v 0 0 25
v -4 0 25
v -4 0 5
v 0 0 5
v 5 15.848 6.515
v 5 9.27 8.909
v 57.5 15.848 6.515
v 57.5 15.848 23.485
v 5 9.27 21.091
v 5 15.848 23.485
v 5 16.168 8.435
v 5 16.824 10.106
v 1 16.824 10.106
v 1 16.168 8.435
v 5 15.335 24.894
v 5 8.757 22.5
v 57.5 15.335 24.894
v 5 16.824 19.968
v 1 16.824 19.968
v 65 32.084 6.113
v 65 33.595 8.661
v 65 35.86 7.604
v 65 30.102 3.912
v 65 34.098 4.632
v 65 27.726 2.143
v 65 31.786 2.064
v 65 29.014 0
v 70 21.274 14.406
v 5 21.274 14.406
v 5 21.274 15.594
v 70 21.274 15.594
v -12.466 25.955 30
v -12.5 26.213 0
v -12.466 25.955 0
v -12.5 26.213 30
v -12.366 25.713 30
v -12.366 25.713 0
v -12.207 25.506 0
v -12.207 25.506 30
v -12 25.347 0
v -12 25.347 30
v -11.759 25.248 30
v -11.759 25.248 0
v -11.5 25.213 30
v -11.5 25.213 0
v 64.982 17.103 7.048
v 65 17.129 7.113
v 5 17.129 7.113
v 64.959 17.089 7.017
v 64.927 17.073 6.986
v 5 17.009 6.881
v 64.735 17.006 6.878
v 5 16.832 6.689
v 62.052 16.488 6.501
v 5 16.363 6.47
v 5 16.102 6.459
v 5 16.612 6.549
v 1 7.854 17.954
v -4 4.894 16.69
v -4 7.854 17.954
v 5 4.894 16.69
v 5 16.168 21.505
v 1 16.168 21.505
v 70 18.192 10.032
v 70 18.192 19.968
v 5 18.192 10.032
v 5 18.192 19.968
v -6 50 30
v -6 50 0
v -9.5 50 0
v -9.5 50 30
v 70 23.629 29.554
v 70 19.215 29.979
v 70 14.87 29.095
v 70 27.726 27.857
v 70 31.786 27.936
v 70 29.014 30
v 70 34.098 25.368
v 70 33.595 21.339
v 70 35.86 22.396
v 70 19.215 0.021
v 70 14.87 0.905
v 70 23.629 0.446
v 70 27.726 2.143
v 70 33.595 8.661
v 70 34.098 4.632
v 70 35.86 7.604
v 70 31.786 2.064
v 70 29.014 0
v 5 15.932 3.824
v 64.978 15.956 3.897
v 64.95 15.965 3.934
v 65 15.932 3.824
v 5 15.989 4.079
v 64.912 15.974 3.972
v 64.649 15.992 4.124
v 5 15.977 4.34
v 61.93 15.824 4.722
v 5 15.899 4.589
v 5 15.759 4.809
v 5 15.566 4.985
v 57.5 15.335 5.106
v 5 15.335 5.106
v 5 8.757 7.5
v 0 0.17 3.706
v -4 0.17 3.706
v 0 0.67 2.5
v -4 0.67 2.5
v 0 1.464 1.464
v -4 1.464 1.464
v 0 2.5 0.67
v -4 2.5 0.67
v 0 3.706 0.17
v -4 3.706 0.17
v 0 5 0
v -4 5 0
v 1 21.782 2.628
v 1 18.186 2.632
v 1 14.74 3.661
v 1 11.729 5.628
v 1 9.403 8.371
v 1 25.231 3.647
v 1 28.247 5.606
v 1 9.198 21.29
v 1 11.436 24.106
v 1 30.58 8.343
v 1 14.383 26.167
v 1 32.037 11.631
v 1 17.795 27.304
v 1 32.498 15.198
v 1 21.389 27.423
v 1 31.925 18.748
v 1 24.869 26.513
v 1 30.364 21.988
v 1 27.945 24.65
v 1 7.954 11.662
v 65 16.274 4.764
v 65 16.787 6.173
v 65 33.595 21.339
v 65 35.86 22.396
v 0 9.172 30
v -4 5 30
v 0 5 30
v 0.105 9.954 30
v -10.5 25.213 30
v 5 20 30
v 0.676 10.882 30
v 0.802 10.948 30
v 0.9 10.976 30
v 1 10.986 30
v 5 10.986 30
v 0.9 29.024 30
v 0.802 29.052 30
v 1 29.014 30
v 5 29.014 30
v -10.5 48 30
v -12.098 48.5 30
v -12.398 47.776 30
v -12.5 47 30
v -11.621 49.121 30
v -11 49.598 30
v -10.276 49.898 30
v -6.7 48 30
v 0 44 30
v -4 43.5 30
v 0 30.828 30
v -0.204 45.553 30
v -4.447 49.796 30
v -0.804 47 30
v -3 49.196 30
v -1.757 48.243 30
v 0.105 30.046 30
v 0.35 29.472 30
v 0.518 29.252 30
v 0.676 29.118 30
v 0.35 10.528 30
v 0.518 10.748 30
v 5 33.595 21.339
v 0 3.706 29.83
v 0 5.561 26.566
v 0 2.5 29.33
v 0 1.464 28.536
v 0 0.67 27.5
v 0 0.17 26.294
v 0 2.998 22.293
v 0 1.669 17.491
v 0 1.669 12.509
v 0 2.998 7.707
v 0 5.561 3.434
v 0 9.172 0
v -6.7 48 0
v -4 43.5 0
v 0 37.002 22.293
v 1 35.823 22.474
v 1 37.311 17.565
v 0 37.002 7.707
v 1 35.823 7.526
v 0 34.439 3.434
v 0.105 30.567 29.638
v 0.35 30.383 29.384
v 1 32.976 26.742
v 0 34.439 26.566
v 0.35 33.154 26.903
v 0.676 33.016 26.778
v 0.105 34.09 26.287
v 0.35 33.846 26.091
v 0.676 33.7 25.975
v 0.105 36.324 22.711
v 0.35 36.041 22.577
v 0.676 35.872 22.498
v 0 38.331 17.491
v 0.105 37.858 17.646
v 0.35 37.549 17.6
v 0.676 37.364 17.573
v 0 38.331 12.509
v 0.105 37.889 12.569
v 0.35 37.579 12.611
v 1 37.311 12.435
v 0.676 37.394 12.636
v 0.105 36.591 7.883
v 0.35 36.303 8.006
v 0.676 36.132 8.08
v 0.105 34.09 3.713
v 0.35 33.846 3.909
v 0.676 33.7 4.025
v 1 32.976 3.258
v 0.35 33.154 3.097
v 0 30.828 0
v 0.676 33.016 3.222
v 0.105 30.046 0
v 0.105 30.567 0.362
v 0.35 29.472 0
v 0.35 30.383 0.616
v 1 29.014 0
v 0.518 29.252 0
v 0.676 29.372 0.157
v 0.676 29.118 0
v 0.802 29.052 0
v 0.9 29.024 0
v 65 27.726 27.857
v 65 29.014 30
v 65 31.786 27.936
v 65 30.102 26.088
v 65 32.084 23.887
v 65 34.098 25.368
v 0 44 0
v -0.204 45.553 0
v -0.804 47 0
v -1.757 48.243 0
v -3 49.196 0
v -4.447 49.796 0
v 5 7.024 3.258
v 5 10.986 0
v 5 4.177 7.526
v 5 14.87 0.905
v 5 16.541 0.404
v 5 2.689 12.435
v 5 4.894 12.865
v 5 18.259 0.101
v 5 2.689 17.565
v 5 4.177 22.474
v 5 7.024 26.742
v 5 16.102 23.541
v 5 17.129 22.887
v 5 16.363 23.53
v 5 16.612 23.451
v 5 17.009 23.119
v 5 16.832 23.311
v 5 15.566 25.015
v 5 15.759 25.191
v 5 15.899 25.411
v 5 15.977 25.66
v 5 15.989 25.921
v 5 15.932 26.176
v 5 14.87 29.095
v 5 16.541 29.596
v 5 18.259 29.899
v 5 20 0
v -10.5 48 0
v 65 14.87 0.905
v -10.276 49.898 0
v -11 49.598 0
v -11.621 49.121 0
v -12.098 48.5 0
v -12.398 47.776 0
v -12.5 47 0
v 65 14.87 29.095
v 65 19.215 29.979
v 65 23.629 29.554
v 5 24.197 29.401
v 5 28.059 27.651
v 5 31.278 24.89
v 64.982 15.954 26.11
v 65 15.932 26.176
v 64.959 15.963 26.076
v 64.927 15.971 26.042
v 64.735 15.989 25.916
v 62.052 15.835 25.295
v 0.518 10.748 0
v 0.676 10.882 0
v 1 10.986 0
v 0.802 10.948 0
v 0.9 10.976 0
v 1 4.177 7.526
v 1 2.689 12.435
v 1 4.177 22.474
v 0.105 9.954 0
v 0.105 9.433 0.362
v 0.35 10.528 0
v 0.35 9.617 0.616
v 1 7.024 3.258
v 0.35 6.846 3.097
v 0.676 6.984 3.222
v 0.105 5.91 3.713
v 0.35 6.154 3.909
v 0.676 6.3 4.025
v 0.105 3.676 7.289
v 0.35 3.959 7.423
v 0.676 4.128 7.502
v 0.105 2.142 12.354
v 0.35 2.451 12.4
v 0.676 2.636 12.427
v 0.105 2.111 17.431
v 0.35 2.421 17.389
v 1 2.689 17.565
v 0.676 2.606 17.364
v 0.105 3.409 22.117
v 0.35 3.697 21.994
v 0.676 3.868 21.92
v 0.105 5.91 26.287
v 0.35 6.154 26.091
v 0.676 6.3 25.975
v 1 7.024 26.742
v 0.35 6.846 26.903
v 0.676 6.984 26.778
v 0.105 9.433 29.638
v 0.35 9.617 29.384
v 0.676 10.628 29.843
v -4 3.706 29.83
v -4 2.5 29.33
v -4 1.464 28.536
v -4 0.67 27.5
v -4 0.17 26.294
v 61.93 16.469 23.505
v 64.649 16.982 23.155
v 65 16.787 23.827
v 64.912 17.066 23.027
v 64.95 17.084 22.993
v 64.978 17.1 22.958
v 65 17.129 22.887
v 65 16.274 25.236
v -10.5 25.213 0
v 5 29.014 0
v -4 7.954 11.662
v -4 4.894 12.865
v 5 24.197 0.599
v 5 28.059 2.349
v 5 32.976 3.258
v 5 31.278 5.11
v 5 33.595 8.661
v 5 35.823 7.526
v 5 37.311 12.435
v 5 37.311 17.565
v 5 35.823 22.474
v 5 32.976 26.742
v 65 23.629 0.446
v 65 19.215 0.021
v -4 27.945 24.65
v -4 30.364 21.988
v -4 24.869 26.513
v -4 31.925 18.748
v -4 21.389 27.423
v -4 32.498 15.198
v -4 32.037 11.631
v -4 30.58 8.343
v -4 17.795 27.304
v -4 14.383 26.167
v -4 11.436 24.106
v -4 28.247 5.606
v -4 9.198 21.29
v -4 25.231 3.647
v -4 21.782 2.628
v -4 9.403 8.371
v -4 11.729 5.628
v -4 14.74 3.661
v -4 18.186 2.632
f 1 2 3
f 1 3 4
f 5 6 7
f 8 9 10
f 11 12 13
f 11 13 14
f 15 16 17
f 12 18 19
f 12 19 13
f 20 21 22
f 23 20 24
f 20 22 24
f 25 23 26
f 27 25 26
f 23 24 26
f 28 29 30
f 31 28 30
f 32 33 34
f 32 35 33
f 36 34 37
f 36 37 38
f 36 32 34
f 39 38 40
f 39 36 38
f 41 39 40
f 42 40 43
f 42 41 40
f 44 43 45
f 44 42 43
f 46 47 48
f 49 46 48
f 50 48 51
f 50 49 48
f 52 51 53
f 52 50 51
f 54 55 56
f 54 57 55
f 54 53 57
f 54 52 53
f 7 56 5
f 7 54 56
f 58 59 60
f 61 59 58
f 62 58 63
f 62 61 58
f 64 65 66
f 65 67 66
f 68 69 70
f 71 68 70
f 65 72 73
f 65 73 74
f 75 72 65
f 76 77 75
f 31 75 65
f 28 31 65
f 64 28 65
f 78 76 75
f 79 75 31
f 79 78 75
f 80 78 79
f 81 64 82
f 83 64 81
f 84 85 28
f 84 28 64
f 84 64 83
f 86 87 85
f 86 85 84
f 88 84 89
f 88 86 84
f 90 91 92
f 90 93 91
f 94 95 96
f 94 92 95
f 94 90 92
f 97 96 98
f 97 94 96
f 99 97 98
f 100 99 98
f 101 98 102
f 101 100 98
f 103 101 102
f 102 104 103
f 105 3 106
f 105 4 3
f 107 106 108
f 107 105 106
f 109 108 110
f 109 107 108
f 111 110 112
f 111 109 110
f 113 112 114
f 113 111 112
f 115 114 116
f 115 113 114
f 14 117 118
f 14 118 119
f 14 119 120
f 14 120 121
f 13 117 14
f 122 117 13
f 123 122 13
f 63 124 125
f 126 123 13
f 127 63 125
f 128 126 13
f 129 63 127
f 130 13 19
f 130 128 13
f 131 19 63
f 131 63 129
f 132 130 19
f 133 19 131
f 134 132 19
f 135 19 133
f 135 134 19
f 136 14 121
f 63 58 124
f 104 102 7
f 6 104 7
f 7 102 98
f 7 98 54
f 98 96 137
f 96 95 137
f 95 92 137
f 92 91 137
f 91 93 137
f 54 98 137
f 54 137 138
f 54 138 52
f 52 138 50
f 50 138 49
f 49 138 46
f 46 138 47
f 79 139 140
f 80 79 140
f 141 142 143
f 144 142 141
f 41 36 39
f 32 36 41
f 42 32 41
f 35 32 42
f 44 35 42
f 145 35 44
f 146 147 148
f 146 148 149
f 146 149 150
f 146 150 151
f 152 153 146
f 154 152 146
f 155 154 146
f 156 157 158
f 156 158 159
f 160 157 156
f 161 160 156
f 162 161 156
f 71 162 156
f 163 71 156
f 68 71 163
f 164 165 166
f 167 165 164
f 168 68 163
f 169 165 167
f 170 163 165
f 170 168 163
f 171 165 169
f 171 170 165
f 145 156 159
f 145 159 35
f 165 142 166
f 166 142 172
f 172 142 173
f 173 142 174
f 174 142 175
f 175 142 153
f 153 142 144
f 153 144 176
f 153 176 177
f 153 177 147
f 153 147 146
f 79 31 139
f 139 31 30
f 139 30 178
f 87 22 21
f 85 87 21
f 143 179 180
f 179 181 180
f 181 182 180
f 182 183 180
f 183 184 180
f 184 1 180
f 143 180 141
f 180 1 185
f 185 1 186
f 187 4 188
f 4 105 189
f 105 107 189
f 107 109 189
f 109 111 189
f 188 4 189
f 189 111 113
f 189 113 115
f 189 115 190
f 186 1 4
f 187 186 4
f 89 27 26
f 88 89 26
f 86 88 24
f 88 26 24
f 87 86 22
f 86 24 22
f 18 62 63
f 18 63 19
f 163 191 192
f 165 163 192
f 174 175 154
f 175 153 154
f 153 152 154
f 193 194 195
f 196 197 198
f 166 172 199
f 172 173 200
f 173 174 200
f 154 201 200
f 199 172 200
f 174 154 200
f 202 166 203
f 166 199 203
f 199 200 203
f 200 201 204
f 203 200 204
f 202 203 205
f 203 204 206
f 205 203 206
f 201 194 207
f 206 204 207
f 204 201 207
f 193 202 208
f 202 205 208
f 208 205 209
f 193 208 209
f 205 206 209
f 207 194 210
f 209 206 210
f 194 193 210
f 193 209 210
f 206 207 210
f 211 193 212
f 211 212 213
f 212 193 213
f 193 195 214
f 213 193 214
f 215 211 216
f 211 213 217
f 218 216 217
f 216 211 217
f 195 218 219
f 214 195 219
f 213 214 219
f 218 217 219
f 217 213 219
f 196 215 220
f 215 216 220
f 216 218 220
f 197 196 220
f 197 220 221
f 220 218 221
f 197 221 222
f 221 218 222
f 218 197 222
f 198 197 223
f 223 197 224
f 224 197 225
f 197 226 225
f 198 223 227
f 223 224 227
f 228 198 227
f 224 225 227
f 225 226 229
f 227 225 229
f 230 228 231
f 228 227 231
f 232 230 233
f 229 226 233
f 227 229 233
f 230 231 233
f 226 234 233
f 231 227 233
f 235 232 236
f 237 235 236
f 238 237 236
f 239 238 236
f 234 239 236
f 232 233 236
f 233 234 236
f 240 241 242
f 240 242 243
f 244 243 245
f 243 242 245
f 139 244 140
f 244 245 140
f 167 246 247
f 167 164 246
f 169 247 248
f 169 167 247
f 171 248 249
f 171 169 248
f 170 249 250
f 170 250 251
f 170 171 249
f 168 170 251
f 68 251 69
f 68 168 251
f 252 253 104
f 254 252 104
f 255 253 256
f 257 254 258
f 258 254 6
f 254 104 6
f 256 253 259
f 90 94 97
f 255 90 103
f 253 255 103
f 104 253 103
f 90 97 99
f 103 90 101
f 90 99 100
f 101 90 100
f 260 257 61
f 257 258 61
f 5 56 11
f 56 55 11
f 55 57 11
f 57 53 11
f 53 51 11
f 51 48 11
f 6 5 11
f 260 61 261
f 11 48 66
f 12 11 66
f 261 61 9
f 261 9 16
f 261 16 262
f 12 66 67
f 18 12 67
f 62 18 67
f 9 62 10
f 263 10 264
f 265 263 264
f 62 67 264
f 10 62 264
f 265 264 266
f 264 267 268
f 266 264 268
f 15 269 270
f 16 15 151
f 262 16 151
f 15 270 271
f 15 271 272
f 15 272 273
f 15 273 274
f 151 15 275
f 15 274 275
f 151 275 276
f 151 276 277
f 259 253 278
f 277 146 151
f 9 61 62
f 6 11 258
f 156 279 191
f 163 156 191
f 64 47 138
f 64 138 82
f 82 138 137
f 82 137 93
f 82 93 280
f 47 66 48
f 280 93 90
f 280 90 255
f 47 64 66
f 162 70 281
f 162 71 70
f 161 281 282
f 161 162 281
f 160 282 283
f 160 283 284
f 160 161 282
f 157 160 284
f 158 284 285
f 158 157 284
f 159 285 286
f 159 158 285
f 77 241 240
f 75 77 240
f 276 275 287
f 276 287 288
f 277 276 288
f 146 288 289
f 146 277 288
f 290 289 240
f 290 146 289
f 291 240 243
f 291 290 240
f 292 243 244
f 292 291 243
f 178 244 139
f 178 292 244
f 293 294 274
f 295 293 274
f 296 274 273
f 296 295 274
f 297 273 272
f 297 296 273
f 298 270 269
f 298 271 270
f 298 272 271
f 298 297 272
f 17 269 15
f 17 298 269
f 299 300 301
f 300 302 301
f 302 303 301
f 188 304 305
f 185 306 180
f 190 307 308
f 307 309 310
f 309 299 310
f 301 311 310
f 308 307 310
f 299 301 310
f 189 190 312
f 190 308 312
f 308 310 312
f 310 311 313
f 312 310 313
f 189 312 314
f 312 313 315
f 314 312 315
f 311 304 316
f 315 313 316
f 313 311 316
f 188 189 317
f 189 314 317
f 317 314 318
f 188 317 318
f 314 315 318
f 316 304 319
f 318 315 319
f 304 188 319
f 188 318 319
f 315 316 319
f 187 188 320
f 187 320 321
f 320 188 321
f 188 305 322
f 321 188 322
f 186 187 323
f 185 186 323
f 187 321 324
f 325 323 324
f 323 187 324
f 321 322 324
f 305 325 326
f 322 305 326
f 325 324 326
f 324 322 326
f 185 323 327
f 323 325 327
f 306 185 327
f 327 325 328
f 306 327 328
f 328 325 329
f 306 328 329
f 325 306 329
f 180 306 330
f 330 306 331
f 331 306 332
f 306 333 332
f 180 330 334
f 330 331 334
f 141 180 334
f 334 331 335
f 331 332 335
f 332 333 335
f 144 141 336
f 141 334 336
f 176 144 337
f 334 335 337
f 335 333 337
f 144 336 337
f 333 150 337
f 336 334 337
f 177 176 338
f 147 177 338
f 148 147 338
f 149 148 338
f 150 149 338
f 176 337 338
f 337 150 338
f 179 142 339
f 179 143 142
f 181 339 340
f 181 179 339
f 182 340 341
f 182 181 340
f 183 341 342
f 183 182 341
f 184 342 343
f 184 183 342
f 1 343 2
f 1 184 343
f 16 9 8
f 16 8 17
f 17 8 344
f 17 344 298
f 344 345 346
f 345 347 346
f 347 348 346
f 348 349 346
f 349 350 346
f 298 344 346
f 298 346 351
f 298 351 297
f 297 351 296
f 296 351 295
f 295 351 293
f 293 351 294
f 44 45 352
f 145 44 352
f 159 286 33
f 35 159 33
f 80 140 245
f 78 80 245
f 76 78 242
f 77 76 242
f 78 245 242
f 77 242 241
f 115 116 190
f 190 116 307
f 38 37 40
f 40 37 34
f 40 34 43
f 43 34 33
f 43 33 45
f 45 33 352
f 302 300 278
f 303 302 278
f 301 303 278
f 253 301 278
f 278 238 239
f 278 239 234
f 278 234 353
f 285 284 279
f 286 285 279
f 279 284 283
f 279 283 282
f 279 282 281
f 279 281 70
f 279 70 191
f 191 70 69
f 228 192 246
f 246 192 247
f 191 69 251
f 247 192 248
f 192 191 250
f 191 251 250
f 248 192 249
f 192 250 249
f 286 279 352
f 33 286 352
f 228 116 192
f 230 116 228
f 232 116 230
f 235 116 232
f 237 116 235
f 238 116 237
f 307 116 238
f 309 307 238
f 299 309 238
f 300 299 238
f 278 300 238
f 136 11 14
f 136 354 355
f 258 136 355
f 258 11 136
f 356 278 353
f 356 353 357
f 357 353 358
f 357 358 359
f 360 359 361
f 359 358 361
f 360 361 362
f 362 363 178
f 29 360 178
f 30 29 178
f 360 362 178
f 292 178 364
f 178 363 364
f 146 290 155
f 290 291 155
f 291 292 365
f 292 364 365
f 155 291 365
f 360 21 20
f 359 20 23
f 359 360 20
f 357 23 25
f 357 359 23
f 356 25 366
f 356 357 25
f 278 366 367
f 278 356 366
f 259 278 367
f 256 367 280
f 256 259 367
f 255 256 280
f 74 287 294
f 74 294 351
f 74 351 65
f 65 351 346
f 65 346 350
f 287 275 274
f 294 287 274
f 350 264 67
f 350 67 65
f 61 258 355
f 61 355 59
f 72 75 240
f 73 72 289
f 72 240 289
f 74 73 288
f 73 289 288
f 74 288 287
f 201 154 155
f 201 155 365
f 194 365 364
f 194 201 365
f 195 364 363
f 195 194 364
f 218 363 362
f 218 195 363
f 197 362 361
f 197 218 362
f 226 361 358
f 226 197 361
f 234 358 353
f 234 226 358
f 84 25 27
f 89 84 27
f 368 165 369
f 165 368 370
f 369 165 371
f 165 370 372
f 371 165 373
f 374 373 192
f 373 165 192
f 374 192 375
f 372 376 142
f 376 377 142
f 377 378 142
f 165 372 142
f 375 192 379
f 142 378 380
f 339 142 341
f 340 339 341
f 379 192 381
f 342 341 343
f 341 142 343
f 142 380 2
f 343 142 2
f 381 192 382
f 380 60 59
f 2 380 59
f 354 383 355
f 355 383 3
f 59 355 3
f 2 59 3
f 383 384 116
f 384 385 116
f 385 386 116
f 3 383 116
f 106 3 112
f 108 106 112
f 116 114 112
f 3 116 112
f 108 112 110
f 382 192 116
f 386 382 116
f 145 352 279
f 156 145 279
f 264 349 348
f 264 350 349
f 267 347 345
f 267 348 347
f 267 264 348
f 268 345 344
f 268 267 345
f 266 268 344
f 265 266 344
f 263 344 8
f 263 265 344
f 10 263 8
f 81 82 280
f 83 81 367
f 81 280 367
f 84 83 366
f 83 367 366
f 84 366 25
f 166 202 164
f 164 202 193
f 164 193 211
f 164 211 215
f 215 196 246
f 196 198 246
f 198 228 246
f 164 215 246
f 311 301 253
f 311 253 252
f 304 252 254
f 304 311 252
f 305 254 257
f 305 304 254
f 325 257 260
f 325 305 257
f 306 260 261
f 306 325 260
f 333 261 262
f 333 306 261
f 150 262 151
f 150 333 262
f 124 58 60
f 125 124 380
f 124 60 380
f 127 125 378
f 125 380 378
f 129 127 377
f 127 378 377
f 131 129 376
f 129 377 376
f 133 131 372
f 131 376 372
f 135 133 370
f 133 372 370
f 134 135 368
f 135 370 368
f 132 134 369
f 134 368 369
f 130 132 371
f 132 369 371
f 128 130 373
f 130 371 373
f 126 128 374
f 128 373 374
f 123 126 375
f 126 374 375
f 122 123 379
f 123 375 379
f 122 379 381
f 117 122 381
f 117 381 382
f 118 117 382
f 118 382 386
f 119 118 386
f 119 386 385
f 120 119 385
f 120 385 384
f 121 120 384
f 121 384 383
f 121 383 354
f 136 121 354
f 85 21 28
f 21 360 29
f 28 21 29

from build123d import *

# Parameters (mm, degrees)
BOSS_EXTRUDE1_DEPTH = 30
BOSS_EXTRUDE3_DEPTH = 5
BOSS_EXTRUDE4_DEPTH = 60
BOSS_EXTRUDE5_DEPTH = 5
RIB2_REACH          = 93.092
SKETCH12_WALL_W     = 244.715003534
SKETCH12_WALL_H     = 1.5
RIB4_REACH          = 88.249
SKETCH15_WALL_W     = 235.02855303
SKETCH15_WALL_H     = 1.5
FILLET2_R           = 6
FILLET3_R           = 3
FILLET4_R           = 5
FILLET6_R           = 1
CUT_EXTRUDE4_DEPTH  = 88.321245983
SKETCH17_R          = 12.5
CUT_EXTRUDE5_DEPTH  = 5
FILLET7_R           = 1
FILLET8_R           = 1


with BuildPart() as part:
    # Sketch1 → Boss-Extrude1 (new body)
    with BuildSketch(Plane.XY):
        Polygon((0, 0), (0, 50), (-12.5, 50), (-12.5, 25.213498553), (-10.5, 25.213498553), (-10.5, 48), (-6.7, 48), (-4, 43.5), (-4, 0), align=None)
    extrude(amount=BOSS_EXTRUDE1_DEPTH)

    # Sketch2 → Boss-Extrude3 (add)
    with BuildSketch(Plane(origin=(0, 0, 0), x_dir=(0, 0, -1), z_dir=(1, 0, 0))):
        with BuildLine():
            Line((-30, 20), (-30, 29.013878189))
            ThreePointArc((-30, 29.013878189), (-15, 37.5), (0, 29.013878189))
            Line((0, 29.013878189), (0, 20))
            Line((0, 20), (0, 10.986121811))
            ThreePointArc((0, 10.986121811), (-15, 2.5), (-30, 10.986121811))
            Line((-30, 10.986121811), (-30, 20))
        make_face()
    extrude(amount=BOSS_EXTRUDE3_DEPTH)

    # Sketch8 → Boss-Extrude4 (add)
    with BuildSketch(Plane(origin=(5, 0, 0), x_dir=(0, 0, -1), z_dir=(1, 0, 0))):
        with BuildLine():
            Line((-15.593853911, 21.273523821), (-14.406146089, 21.273523821))
            Line((-14.406146089, 21.273523821), (-8.660726074, 33.594616806))
            ThreePointArc((-8.660726074, 33.594616806), (-1.141807012, 25.740251485), (-0.904610688, 14.86969785))
            Line((-0.904610688, 14.86969785), (-10.032290508, 18.191901612))
            Line((-10.032290508, 18.191901612), (-19.967709492, 18.191901612))
            Line((-19.967709492, 18.191901612), (-29.095389312, 14.86969785))
            ThreePointArc((-29.095389312, 14.86969785), (-28.858192988, 25.740251485), (-21.339273926, 33.594616806))
            Line((-21.339273926, 33.594616806), (-15.593853911, 21.273523821))
        make_face()
    extrude(amount=BOSS_EXTRUDE4_DEPTH)

    # Sketch9 → Boss-Extrude5 (add)
    with BuildSketch(Plane(origin=(65, 0, 0), x_dir=(0, 0, -1), z_dir=(1, 0, 0))):
        with BuildLine():
            Line((-21.339273926, 33.594616806), (-22.39581958, 35.860386273))
            ThreePointArc((-22.39581958, 35.860386273), (-26.709477013, 33.005312303), (-30, 29.013878189))
            Line((-30, 29.013878189), (-27.857142857, 27.726181305))
            ThreePointArc((-27.857142857, 27.726181305), (-29.930908857, 21.438040583), (-29.095389312, 14.86969785))
            Line((-29.095389312, 14.86969785), (-19.967709492, 18.191901612))
            Line((-19.967709492, 18.191901612), (-10.032290508, 18.191901612))
            Line((-10.032290508, 18.191901612), (-0.904610688, 14.86969785))
            ThreePointArc((-0.904610688, 14.86969785), (-0.069091143, 21.438040583), (-2.142857143, 27.726181305))
            Line((-2.142857143, 27.726181305), (0, 29.013878189))
            ThreePointArc((0, 29.013878189), (-3.290522987, 33.005312303), (-7.60418042, 35.860386273))
            Line((-7.60418042, 35.860386273), (-8.660726074, 33.594616806))
            Line((-8.660726074, 33.594616806), (-14.406146089, 21.273523821))
            Line((-14.406146089, 21.273523821), (-15.593853911, 21.273523821))
            Line((-15.593853911, 21.273523821), (-21.339273926, 33.594616806))
        make_face()
    extrude(amount=BOSS_EXTRUDE5_DEPTH)

    # Sketch12 wall → Rib2 (add, up to next)
    with BuildSketch(Plane(origin=(35, 12.772029248, 23.163468829), x_dir=(0.991227900683, 0.1241932725, 0.045202654495), z_dir=(-0.132163720089, 0.931449543789, 0.33901990866)), mode=Mode.PRIVATE) as rib2_sk1:
        Rectangle(SKETCH12_WALL_W, SKETCH12_WALL_H)
    rib2_tool1 = extrude(rib2_sk1.sketch, amount=RIB2_REACH, mode=Mode.PRIVATE) - part.part
    add(rib2_tool1.solids().sort_by_distance((35, 12.772029248, 23.163468829))[0])

    # Sketch15 wall → Rib4 (add, up to next)
    with BuildSketch(Plane(origin=(35, 12.772029248, 6.836531171), x_dir=(0.991227900683, 0.1241932725, -0.045202654495), z_dir=(-0.132163720089, 0.931449543789, -0.33901990866)), mode=Mode.PRIVATE) as rib4_sk1:
        Rectangle(SKETCH15_WALL_W, SKETCH15_WALL_H)
    rib4_tool1 = extrude(rib4_sk1.sketch, amount=RIB4_REACH, mode=Mode.PRIVATE) - part.part
    add(rib4_tool1.solids().sort_by_distance((35, 12.772029248, 6.836531171))[0])

    # Fillet2
    fillet2_edges = [part.edges().sort_by_distance(p)[0] for p in [
        (0, 50, 15),
    ]]
    fillet(fillet2_edges, radius=FILLET2_R)

    # Fillet3
    fillet3_edges = [part.edges().sort_by_distance(p)[0] for p in [
        (-12.5, 50, 15),
    ]]
    fillet(fillet3_edges, radius=FILLET3_R)

    # Fillet4
    fillet4_edges = [part.edges().sort_by_distance(p)[0] for p in [
        (-2, 0, 0),
        (-2, 0, 30),
    ]]
    fillet(fillet4_edges, radius=FILLET4_R)

    # Fillet6
    # the kernel refuses this fillet: 1 mm, written as the material it adds along each edge
    with BuildSketch(Plane(origin=(67.5, 16.274284624, 25.236318868), x_dir=(-8.283054797608712e-12, -0.34202014332566627, 0.9396926207859093), z_dir=(-1.0, 2.8329715890524774e-12, -7.783525470878232e-12))) as fillet6_piece_1_section:
        with BuildLine():
            CenterArc((FILLET6_R, -FILLET6_R), FILLET6_R, 90, 90)
            Line((0, -FILLET6_R), (0, 0))
            Line((0, 0), (FILLET6_R, 0))
        make_face()
    fillet6_piece_1 = extrude(amount=65, mode=Mode.PRIVATE)
    fillet6_piece_1 = split(fillet6_piece_1, bisect_by=Plane(origin=(34.683018445, 12.397159057, 24.069843938), z_dir=(-0.13216372008897792, 0.9314495437888441, 0.33901990865994336)), keep=Keep.TOP, mode=Mode.PRIVATE)
    add(fillet6_piece_1)
    with BuildSketch(Plane(origin=(2.5, 16.787314839, 23.826779936), x_dir=(8.283054797608713e-12, 0.3420201433256657, -0.9396926207859096), z_dir=(1.0, -2.8329715890524774e-12, 7.783525470878232e-12))) as fillet6_piece_2_section:
        with BuildLine():
            CenterArc((FILLET6_R, -FILLET6_R), FILLET6_R, 90, 90)
            Line((0, -FILLET6_R), (0, 0))
            Line((0, 0), (FILLET6_R, 0))
        make_face()
    fillet6_piece_2 = extrude(amount=65, mode=Mode.PRIVATE)
    fillet6_piece_2 = split(fillet6_piece_2, bisect_by=Plane(origin=(4.790210247, 9.320920511, 20.868309995), z_dir=(-0.13216372008897792, 0.9314495437888441, 0.33901990865994336)), keep=Keep.TOP, mode=Mode.PRIVATE)
    add(fillet6_piece_2)
    with BuildSketch(Plane(origin=(67.5, 16.787314839, 6.173220063), x_dir=(8.283047858714808e-12, 0.3420201433256657, 0.9396926207859096), z_dir=(-1.0, 2.8329692158109876e-12, 7.783518950450833e-12))) as fillet6_piece_3_section:
        with BuildLine():
            CenterArc((FILLET6_R, -FILLET6_R), FILLET6_R, 90, 90)
            Line((0, -FILLET6_R), (0, 0))
            Line((0, 0), (FILLET6_R, 0))
        make_face()
    fillet6_piece_3 = extrude(amount=65, mode=Mode.PRIVATE)
    fillet6_piece_3 = split(fillet6_piece_3, bisect_by=Plane(origin=(34.683018444, 13.067468711, 7.7718167), z_dir=(-0.13216372008897792, 0.9314495437888441, -0.33901990865994336)), keep=Keep.TOP, mode=Mode.PRIVATE)
    add(fillet6_piece_3)
    with BuildSketch(Plane(origin=(2.5, 16.274284624, 4.763681132), x_dir=(-8.283047858714808e-12, -0.342020143325666, -0.9396926207859094), z_dir=(1.0, -2.8329692158109876e-12, -7.783518950450833e-12))) as fillet6_piece_4_section:
        with BuildLine():
            CenterArc((FILLET6_R, -FILLET6_R), FILLET6_R, 90, 90)
            Line((0, -FILLET6_R), (0, 0))
            Line((0, 0), (FILLET6_R, 0))
        make_face()
    fillet6_piece_4 = extrude(amount=65, mode=Mode.PRIVATE)
    fillet6_piece_4 = split(fillet6_piece_4, bisect_by=Plane(origin=(4.790210247, 8.653026917, 7.296667437), z_dir=(-0.13216372008897792, 0.9314495437888441, -0.33901990865994336)), keep=Keep.TOP, mode=Mode.PRIVATE)
    add(fillet6_piece_4)

    # Sketch16 → Cut-Extrude4 (cut, through all)
    with BuildSketch(Plane(origin=(5, 0, 0), x_dir=(0, 0, -1), z_dir=(1, 0, 0))):
        Polygon((-19.967709492, 16.824178281), (-10.106442475, 16.824178281), (-8.435471613, 16.167725442), (-12.864533528, 4.893749658), (-16.690177608, 4.893749658), (-21.504850857, 16.167725442), align=None)
    extrude(amount=-CUT_EXTRUDE4_DEPTH, mode=Mode.SUBTRACT)

    # Sketch17 → Cut-Extrude5 (cut)
    with BuildSketch(Plane.ZY.offset(4)):
        with Locations((15, 20)):
            Circle(SKETCH17_R)
    extrude(amount=-CUT_EXTRUDE5_DEPTH, mode=Mode.SUBTRACT)

    # Fillet7
    fillet7_edges = [part.edges().sort_by_distance(p)[0] for p in [
        (-12.5, 25.213498553, 15),
    ]]
    fillet(fillet7_edges, radius=FILLET7_R)

    # Fillet8
    fillet8_edges = [part.edges().sort_by_distance(p)[0] for p in [
        (0, 37.5, 15),
        (0, 2.5, 15),
    ]]
    fillet(fillet8_edges, radius=FILLET8_R)


solid = part.part
